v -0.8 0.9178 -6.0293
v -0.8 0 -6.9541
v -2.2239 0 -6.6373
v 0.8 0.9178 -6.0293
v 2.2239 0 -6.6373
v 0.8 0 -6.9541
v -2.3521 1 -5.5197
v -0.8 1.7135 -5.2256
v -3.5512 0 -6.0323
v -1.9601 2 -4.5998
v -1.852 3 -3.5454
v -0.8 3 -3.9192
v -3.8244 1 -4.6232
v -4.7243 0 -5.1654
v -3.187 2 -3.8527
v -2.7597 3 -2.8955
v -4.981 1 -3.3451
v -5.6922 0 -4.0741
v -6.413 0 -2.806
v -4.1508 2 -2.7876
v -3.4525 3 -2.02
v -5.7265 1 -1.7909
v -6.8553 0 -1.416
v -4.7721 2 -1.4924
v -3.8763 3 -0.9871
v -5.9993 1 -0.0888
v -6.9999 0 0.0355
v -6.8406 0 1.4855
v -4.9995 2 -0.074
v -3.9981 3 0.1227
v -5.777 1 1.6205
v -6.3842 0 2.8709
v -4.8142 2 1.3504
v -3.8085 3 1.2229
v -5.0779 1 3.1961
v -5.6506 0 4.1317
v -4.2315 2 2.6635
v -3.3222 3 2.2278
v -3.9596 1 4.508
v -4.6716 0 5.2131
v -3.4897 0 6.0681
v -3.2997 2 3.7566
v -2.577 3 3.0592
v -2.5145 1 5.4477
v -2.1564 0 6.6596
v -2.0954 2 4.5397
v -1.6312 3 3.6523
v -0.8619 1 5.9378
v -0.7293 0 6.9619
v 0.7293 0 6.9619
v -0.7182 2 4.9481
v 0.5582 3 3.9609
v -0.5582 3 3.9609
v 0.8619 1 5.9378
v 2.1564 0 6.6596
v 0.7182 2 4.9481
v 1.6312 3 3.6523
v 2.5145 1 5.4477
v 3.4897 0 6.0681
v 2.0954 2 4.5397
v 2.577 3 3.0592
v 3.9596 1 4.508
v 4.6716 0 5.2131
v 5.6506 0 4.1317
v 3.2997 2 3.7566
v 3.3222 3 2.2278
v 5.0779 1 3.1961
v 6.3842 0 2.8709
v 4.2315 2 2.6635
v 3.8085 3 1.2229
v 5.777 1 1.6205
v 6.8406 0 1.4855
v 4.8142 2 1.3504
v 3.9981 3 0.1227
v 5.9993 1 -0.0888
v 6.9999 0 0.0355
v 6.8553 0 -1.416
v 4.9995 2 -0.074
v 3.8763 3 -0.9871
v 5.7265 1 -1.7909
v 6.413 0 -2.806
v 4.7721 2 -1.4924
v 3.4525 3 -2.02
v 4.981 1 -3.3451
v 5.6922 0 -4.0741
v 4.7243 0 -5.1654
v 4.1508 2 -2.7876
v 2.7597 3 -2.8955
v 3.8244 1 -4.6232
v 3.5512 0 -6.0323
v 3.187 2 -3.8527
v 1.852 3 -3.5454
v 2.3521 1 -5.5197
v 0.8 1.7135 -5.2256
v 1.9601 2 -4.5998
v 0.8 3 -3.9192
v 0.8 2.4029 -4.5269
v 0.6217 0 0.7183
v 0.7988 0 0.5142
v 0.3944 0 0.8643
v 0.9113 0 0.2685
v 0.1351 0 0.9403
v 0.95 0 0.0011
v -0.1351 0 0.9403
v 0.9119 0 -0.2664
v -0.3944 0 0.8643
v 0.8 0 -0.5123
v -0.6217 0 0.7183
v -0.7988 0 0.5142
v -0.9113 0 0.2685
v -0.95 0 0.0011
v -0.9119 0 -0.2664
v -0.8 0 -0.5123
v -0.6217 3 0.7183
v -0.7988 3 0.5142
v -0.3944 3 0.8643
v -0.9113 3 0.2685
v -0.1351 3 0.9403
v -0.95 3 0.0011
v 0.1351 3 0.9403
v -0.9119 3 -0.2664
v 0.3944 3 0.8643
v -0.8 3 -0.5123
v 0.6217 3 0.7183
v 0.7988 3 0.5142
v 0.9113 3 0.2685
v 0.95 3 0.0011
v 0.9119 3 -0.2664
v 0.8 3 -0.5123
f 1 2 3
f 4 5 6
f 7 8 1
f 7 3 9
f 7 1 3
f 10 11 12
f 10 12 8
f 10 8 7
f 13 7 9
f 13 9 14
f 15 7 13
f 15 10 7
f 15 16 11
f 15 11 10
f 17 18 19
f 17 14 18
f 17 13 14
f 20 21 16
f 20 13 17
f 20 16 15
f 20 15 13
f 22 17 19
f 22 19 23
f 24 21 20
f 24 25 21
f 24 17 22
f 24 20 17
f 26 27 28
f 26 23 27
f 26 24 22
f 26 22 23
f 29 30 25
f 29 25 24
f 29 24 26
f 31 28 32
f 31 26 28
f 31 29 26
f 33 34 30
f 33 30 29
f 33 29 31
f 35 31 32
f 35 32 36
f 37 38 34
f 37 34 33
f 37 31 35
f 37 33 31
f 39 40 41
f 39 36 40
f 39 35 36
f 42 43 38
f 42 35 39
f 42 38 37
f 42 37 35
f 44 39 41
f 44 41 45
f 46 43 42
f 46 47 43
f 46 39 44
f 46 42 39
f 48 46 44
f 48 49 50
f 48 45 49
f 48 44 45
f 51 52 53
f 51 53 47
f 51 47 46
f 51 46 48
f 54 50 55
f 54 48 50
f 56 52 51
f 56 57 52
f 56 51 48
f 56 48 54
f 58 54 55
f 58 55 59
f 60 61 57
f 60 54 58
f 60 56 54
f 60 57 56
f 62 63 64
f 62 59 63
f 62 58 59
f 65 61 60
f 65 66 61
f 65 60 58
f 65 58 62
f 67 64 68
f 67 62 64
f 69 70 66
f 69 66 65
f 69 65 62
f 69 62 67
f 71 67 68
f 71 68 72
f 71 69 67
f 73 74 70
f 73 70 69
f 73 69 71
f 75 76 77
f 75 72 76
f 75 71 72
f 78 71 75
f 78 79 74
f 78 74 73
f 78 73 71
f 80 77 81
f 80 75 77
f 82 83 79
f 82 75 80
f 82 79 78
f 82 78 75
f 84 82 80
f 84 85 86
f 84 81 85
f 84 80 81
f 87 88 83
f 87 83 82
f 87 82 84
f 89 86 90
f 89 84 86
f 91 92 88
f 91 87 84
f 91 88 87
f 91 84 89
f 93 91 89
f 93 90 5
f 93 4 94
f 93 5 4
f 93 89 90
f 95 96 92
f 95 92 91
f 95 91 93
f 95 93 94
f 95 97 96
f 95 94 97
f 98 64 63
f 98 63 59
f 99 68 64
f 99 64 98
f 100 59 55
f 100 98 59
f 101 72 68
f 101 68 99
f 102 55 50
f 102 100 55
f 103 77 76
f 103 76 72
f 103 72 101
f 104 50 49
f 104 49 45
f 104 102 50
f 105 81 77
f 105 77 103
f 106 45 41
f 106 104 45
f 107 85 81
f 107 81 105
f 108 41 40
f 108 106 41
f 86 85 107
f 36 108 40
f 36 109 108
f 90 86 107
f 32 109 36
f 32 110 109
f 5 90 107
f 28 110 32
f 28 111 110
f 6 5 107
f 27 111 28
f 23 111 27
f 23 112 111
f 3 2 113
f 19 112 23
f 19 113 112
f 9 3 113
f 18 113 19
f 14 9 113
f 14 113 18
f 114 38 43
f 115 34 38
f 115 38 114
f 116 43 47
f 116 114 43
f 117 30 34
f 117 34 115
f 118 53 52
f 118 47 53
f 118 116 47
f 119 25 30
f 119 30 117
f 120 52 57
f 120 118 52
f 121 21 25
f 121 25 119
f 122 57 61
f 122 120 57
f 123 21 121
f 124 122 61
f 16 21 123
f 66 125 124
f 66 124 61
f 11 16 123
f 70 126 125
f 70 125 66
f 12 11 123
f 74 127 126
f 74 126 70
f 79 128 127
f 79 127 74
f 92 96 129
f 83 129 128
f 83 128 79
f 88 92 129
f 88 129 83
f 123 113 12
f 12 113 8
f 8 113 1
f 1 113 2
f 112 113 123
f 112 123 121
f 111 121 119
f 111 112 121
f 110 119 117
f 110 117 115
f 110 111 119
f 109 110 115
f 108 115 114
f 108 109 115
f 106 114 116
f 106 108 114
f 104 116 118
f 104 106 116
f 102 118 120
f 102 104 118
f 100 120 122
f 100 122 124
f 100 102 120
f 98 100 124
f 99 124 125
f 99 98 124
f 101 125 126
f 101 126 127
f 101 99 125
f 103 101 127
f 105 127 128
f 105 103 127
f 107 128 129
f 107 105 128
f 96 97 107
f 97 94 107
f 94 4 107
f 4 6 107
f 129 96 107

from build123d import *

# Parameters (mm, degrees)
CUT_EXTRUDE1_DEPTH      = 11.344080433
CUT_EXTRUDE1_DEPTH_BACK = 11.344080433
SKETCH2_R               = 0.95
CUT_EXTRUDE2_DEPTH      = 11.344080433
CUT_EXTRUDE2_DEPTH_BACK = 11.344080433


with BuildPart() as part:
    # Sketch1 → Revolve1 (revolve)
    with BuildSketch(Plane.XY):
        Polygon((0, 0), (7, 0), (4, 3), (0, 3), align=None)
    revolve(axis=Axis((0, -1026.355569878, 0), (0, 1, 0)))

    # Sketch2 → Cut-Extrude1 (cut, two sides: drawn at the far end of the back side and taken through both)
    with BuildSketch(Plane(origin=(0, 3, 0), x_dir=(1, 0, 0), z_dir=(0, 1, 0)).offset(-CUT_EXTRUDE1_DEPTH_BACK)):
        with Locations(Location((0, 0, 0), (0, 0, 180))):
            Circle(SKETCH2_R)
    extrude(amount=CUT_EXTRUDE1_DEPTH + CUT_EXTRUDE1_DEPTH_BACK, mode=Mode.SUBTRACT)

    # Sketch3 → Cut-Extrude2 (cut, two sides: drawn at the far end of the back side and taken through both)
    with BuildSketch(Plane(origin=(0, 3, 0), x_dir=(1, 0, 0), z_dir=(0, 1, 0)).offset(-CUT_EXTRUDE2_DEPTH_BACK)):
        with BuildLine():
            Line((-0.8, 0.512347538), (-0.8, 6.95413546))
            ThreePointArc((-0.8, 6.95413546), (0, 7), (0.8, 6.95413546))
            Line((0.8, 6.95413546), (0.8, 0.512347538))
            ThreePointArc((0.8, 0.512347538), (0, 0.95), (-0.8, 0.512347538))
        make_face()
    extrude(amount=CUT_EXTRUDE2_DEPTH + CUT_EXTRUDE2_DEPTH_BACK, mode=Mode.SUBTRACT)


solid = part.part
